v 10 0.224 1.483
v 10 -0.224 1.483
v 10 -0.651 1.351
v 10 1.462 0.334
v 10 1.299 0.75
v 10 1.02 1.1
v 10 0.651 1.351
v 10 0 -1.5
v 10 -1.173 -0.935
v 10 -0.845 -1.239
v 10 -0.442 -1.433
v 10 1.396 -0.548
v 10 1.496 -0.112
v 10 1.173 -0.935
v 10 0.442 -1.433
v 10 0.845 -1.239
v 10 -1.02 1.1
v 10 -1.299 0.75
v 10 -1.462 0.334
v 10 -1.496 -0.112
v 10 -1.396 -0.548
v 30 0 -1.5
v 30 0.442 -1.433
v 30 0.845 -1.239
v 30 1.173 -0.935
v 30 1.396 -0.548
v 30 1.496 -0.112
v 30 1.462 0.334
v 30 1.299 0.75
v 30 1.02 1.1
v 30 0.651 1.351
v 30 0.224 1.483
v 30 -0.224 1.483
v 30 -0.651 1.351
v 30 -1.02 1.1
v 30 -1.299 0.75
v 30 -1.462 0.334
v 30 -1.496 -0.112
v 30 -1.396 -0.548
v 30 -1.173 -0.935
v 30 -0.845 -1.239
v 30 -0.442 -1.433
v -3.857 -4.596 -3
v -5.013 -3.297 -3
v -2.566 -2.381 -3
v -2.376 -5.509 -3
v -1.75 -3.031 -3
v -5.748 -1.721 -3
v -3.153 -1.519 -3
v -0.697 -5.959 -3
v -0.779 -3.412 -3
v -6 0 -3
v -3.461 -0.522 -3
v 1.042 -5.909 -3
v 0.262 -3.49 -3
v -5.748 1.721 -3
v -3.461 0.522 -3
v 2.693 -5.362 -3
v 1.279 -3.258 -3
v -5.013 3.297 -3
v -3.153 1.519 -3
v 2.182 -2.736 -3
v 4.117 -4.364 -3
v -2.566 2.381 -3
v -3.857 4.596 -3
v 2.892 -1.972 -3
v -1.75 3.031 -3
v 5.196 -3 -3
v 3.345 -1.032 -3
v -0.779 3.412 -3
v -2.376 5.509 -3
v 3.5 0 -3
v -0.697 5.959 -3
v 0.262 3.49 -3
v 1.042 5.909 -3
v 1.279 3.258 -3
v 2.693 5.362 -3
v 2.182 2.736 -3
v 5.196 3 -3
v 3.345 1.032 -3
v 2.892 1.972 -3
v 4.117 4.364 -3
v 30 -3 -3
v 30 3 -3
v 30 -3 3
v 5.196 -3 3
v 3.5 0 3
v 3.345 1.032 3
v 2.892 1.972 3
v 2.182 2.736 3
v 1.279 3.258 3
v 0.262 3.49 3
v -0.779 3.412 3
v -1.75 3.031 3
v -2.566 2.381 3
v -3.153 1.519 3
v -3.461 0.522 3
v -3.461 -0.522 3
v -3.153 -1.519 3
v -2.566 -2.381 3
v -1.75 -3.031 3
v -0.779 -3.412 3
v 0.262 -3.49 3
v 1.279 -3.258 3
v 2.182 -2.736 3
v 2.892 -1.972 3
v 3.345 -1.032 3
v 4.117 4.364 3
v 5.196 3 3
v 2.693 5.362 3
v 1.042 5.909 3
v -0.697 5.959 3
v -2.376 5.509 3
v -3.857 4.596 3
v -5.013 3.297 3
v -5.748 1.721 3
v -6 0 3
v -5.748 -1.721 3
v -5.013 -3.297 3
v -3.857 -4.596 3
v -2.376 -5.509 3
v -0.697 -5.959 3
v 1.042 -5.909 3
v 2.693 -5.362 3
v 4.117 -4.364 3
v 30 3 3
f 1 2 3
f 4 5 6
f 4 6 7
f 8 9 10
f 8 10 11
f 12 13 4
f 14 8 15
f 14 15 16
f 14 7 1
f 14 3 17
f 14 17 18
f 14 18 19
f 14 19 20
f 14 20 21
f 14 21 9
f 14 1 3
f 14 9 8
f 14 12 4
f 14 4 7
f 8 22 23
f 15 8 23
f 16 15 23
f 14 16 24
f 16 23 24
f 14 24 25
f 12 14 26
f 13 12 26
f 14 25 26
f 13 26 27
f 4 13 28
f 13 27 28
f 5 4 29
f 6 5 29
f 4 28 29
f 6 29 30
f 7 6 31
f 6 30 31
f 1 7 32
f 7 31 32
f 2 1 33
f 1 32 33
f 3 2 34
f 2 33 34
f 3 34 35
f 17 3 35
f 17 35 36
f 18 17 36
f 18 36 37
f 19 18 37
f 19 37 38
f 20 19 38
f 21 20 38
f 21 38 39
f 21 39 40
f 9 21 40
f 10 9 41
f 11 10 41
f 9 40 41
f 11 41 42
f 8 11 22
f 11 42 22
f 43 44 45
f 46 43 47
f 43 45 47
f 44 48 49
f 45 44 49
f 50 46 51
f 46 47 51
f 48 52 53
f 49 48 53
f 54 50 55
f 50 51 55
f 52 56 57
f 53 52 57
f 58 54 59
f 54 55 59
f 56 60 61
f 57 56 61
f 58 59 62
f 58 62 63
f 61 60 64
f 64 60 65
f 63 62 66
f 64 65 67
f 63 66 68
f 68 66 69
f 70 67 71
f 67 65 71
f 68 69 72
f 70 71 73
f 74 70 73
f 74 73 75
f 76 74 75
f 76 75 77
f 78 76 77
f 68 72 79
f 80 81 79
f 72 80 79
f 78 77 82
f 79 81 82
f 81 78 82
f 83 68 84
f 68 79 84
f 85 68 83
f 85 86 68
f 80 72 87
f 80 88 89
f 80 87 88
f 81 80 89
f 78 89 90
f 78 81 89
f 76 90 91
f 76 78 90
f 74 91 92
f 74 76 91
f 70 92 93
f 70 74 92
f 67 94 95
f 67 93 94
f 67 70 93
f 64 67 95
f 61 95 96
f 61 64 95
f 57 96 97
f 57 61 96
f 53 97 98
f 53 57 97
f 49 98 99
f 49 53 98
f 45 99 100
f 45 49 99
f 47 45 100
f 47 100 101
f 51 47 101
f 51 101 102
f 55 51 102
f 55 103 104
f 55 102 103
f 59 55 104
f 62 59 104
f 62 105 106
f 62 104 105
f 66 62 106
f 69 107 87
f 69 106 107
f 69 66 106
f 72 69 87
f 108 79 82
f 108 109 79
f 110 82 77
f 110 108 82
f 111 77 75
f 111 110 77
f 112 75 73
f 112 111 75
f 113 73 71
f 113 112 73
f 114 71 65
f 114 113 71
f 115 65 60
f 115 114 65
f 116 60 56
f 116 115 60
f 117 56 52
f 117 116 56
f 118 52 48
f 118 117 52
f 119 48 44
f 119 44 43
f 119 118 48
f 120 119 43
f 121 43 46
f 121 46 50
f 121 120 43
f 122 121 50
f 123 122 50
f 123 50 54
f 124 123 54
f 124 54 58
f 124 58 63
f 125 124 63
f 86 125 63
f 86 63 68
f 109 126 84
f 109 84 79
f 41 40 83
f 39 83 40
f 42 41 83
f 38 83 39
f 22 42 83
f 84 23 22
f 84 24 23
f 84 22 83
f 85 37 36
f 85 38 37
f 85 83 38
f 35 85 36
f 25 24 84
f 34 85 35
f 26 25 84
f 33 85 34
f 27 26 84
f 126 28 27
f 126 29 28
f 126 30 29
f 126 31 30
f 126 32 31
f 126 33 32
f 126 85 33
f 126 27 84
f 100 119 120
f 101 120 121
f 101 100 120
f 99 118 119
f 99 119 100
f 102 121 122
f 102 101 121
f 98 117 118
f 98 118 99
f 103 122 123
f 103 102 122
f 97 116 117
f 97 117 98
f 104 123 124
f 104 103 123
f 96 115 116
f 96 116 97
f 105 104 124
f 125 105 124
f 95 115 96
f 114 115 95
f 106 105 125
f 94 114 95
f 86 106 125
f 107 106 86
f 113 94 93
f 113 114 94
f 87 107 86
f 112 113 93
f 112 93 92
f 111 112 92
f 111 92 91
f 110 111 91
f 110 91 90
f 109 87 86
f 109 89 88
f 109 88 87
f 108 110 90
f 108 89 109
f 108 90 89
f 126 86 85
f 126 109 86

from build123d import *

# Parameters (mm, degrees)
BOSS_EXTRUDE1_DEPTH     = 3
CUT_EXTRUDE1_DEPTH      = 32.176914536
CUT_EXTRUDE1_DEPTH_BACK = 32.176914536
SKETCH10_R              = 3.5
SKETCH11_R              = 1.5
CUT_EXTRUDE2_DEPTH      = 20


with BuildPart() as part:
    # Sketch1 → Boss-Extrude1 (new, symmetric)
    with BuildSketch(Plane.XY):
        with BuildLine():
            Line((5.196152423, -3), (30, -3))
            Line((30, -3), (30, 3))
            Line((30, 3), (5.196152423, 3))
            ThreePointArc((5.196152423, 3), (-6, 0), (5.196152423, -3))
        make_face()
    extrude(amount=BOSS_EXTRUDE1_DEPTH, both=True)

    # Sketch10 → Cut-Extrude1 (cut, two sides: drawn at the far end of the back side and taken through both)
    with BuildSketch(Plane.XY.offset(3).offset(-CUT_EXTRUDE1_DEPTH_BACK)):
        Circle(SKETCH10_R)
    extrude(amount=CUT_EXTRUDE1_DEPTH + CUT_EXTRUDE1_DEPTH_BACK, mode=Mode.SUBTRACT)

    # Sketch11 → Cut-Extrude2 (cut)
    with BuildSketch(Plane(origin=(30, 0, 0), x_dir=(0, 0, -1), z_dir=(1, 0, 0))):
        Circle(SKETCH11_R)
    extrude(amount=-CUT_EXTRUDE2_DEPTH, mode=Mode.SUBTRACT)


solid = part.part
